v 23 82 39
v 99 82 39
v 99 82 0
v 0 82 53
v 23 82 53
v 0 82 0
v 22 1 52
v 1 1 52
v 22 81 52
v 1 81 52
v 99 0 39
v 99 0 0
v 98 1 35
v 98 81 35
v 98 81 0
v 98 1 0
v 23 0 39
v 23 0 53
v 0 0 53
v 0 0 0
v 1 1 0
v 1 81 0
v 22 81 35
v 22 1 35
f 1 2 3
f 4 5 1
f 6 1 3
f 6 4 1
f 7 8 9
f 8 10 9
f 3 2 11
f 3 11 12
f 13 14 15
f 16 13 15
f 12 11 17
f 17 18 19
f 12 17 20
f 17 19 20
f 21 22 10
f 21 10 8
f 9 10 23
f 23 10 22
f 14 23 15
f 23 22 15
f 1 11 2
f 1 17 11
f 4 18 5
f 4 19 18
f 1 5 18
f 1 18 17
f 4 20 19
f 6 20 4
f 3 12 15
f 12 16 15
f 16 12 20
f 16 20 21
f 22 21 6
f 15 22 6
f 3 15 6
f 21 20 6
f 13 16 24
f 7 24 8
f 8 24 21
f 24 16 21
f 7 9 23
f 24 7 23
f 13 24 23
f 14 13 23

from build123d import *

# Parameters (mm, degrees)
BOSS_EXTRU_1_DEPTH = 52
ESQUISSE2_W        = 22
ESQUISSE2_H        = 82
BOSS_EXTRU_2_DEPTH = 1
ESQUISSE3_W        = 18
ESQUISSE3_H        = 82
BOSS_EXTRU_3_DEPTH = 1
BOSS_EXTRU_4_START = -1
BOSS_EXTRU_4_DEPTH = 76
ESQUISSE6_W        = 39
ESQUISSE6_H        = 82
BOSS_EXTRU_5_DEPTH = 1


with BuildPart() as part:
    # Esquisse1 → Boss.-Extru.1 (new body)
    with BuildSketch(Plane.XY):
        Polygon((22, 82), (22, 81), (21, 81), (1, 81), (1, 1), (21, 1), (22, 1), (22, 0), (0, 0), (0, 82), align=None)
    extrude(amount=BOSS_EXTRU_1_DEPTH)

    # Esquisse2 → Boss.-Extru.2 (add)
    with BuildSketch(Plane.XY.offset(52)):
        with Locations((11, 41)):
            Rectangle(ESQUISSE2_W, ESQUISSE2_H)
    extrude(amount=BOSS_EXTRU_2_DEPTH)

    # Esquisse3 → Boss.-Extru.3 (add)
    with BuildSketch(Plane(origin=(22, 0, 0), x_dir=(0, 0, -1), z_dir=(1, 0, 0))):
        with Locations((-44, 41)):
            Rectangle(ESQUISSE3_W, ESQUISSE3_H)
    extrude(amount=BOSS_EXTRU_3_DEPTH)

    # Esquisse5 → Boss.-Extru.4 (add)
    with BuildSketch(Plane(origin=(23, 0, 0), x_dir=(0, 0, -1), z_dir=(1, 0, 0)).offset(BOSS_EXTRU_4_START)):
        Polygon((-39, 0), (0, 0), (0, 1), (-35, 1), (-35, 81), (0, 81), (0, 82), (-39, 82), align=None)
    extrude(amount=BOSS_EXTRU_4_DEPTH)

    # Esquisse6 → Boss.-Extru.5 (add)
    with BuildSketch(Plane(origin=(98, 0, 0), x_dir=(0, 0, -1), z_dir=(1, 0, 0))):
        with Locations((-19.5, 41)):
            Rectangle(ESQUISSE6_W, ESQUISSE6_H)
    extrude(amount=BOSS_EXTRU_5_DEPTH)


solid = part.part
